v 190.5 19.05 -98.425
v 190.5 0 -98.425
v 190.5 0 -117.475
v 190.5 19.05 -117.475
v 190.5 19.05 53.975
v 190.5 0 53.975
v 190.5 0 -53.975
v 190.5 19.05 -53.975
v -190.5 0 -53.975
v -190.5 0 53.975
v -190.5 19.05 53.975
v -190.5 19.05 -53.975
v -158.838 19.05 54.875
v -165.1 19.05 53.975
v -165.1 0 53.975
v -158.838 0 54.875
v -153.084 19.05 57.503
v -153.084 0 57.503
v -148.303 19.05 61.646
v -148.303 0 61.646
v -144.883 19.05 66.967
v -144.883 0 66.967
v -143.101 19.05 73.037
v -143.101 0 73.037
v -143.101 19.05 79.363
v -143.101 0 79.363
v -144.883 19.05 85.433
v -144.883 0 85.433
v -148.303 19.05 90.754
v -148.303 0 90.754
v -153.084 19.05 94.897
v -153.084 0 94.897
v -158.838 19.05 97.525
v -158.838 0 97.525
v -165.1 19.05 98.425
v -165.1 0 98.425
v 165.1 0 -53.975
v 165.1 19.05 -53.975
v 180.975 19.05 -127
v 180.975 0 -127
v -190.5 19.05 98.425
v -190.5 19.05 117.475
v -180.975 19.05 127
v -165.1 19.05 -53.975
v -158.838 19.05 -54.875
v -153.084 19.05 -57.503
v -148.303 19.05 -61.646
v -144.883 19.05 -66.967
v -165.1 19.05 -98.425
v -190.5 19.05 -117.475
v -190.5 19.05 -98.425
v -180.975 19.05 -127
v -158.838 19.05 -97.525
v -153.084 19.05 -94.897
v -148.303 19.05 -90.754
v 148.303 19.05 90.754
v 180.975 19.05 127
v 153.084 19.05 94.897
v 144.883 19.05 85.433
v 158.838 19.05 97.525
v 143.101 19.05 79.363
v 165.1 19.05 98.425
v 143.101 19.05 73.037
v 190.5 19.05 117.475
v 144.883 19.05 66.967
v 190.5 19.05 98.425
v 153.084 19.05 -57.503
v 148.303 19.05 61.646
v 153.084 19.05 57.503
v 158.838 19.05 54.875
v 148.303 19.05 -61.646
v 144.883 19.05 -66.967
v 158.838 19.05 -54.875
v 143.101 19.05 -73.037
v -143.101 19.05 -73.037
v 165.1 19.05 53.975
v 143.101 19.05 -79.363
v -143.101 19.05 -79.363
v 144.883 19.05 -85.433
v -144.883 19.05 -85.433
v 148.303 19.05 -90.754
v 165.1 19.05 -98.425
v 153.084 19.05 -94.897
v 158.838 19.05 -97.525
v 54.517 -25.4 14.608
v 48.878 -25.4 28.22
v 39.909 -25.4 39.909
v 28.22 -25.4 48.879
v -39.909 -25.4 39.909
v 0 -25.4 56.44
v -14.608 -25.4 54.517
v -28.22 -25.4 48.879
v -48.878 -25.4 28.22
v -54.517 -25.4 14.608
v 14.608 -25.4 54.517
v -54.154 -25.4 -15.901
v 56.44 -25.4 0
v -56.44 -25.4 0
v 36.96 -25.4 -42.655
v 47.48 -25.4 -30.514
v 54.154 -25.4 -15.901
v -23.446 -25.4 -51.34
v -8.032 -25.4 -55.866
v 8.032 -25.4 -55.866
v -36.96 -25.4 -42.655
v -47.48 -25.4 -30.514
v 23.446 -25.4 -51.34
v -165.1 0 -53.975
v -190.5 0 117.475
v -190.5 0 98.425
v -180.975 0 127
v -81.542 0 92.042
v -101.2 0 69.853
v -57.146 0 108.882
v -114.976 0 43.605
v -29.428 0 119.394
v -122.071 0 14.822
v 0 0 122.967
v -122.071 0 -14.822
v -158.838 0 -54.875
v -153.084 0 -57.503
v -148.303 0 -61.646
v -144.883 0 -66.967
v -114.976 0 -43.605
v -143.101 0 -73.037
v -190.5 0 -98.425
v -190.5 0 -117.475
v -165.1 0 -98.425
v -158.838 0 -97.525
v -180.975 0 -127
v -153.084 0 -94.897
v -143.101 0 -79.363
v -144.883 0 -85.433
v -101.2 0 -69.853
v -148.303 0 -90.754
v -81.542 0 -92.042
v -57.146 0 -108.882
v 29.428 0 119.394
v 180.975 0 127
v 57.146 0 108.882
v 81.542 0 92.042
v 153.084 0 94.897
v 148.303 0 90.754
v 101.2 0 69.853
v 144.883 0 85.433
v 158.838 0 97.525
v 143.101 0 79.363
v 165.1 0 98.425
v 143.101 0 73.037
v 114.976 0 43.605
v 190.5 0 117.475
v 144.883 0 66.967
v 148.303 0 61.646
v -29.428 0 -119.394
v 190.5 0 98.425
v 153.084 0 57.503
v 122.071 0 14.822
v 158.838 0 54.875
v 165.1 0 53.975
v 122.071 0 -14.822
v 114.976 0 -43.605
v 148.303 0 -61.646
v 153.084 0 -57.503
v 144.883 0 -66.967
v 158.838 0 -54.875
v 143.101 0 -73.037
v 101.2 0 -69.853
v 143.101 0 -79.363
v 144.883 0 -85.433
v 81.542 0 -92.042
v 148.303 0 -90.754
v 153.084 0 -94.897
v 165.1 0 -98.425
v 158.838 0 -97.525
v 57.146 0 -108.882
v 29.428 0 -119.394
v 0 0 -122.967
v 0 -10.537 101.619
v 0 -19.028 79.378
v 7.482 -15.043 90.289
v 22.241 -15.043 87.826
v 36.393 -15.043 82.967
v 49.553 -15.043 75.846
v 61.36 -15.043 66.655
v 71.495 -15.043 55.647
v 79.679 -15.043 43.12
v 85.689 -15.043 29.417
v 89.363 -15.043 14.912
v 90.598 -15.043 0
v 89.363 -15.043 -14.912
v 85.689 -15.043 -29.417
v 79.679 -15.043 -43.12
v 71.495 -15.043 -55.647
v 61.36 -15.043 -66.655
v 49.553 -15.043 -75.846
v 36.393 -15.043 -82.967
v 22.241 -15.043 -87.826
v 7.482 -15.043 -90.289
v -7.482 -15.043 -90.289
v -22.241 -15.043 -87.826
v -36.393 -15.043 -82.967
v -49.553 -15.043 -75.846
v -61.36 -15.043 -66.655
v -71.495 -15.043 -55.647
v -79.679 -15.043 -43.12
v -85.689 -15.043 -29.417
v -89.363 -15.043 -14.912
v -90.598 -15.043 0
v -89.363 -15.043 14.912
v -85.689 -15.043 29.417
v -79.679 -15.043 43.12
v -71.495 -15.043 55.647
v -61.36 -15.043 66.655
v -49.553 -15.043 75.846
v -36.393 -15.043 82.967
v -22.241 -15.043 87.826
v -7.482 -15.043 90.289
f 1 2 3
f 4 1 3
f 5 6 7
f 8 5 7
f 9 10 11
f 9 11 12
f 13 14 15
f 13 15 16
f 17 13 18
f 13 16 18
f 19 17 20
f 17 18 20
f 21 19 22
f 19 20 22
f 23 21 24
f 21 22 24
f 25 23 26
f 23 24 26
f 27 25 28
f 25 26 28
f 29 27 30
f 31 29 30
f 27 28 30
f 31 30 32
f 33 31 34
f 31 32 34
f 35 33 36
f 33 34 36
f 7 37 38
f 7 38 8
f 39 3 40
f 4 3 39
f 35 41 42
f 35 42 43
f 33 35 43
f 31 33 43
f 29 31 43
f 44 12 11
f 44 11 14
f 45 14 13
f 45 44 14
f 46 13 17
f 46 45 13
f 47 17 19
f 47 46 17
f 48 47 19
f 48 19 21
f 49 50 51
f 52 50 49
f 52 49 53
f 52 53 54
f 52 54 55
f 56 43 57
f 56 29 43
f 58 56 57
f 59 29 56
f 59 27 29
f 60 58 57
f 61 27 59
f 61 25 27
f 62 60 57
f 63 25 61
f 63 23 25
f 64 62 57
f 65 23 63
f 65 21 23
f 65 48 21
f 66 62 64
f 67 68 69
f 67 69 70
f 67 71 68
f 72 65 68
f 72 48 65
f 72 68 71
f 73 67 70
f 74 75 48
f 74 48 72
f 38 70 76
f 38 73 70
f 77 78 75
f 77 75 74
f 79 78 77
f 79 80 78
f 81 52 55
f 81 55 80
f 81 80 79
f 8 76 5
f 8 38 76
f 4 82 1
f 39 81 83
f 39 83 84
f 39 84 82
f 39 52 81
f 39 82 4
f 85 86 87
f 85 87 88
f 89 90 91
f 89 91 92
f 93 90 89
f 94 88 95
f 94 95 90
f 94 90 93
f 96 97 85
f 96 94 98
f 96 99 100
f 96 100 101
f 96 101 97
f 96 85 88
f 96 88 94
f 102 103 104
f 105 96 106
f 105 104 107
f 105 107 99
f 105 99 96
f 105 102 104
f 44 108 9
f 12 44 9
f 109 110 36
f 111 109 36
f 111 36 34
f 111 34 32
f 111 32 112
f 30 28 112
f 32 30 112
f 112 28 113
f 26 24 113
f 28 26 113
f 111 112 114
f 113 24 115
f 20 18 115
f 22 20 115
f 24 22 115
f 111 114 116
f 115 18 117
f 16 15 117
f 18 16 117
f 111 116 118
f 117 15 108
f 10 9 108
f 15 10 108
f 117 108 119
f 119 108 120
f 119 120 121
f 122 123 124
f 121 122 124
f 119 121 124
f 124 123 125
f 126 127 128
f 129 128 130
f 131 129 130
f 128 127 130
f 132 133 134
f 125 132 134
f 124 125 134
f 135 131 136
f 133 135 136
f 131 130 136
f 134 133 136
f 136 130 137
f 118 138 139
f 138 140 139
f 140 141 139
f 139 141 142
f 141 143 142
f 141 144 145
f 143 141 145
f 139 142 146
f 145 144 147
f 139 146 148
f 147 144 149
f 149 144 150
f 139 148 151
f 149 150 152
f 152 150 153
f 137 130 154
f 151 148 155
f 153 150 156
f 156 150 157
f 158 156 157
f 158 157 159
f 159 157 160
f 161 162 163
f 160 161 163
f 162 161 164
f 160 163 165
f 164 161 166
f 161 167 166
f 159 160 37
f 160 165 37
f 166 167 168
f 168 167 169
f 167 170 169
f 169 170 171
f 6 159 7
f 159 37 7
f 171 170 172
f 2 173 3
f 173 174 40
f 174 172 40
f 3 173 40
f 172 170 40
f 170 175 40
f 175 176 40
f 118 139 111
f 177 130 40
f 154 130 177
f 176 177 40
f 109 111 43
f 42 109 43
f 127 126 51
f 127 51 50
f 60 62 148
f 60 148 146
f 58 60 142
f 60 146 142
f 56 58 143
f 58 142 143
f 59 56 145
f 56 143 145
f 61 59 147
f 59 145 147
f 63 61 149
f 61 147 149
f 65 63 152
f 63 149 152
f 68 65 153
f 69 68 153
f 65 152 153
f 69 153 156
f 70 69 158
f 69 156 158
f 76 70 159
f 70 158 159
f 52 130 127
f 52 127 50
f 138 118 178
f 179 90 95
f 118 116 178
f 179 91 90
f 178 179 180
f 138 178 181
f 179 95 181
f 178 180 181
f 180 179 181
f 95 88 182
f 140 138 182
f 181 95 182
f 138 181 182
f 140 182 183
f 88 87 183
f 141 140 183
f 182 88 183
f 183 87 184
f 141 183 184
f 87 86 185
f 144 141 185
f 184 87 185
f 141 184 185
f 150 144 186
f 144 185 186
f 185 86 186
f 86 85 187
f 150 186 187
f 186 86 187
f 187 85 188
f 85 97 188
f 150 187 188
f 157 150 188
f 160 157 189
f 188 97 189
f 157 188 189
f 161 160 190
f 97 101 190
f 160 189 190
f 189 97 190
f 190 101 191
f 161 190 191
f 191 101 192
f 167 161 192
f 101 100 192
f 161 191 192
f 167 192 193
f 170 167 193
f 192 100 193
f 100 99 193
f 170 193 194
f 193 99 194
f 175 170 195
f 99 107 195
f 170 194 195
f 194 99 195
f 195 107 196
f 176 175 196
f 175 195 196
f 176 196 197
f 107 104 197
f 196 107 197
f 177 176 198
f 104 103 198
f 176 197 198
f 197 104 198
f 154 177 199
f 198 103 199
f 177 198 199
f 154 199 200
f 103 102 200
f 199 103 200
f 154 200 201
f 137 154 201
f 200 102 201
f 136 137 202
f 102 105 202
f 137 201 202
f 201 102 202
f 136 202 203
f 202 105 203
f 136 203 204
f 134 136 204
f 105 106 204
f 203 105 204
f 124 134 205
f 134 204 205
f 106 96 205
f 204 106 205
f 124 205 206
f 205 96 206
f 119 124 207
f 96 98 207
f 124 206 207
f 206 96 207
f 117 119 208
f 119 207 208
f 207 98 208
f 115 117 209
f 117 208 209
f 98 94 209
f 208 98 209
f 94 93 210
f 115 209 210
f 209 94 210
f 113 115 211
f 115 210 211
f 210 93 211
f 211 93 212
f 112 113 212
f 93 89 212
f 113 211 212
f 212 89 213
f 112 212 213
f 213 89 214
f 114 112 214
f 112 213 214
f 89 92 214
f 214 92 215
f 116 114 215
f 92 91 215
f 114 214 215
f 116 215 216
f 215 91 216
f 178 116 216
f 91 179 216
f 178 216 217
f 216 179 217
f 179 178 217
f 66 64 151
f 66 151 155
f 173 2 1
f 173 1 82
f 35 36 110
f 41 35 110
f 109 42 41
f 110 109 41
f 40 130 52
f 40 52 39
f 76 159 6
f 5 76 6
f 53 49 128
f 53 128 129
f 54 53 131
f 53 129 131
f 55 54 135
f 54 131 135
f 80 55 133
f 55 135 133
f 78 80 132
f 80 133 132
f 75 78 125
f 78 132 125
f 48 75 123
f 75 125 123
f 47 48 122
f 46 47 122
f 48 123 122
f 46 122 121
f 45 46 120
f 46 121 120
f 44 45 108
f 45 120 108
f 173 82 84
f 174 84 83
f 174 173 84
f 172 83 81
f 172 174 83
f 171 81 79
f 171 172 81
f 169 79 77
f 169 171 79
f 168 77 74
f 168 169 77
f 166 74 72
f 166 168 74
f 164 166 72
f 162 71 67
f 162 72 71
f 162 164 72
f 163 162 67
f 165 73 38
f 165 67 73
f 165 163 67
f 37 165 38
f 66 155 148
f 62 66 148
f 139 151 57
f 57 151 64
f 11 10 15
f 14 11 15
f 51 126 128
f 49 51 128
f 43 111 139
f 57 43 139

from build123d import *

# Parameters (mm, degrees)
SKETCH1_W               = 381
SKETCH1_H               = 254
BASE_EXTRUDE_DEPTH      = 19.05
CUT_EXTRUDE1_DEPTH      = 20.05
CUT_EXTRUDE2_DEPTH      = 128
CUT_EXTRUDE2_DEPTH_BACK = 128
CHAMFER1_SIZE           = 9.525


with BuildPart() as part:
    # Sketch1 → Base-Extrude (new body)
    with BuildSketch(Plane(origin=(0, 0, 0), x_dir=(1, 0, 0), z_dir=(0, 1, 0))):
        Rectangle(SKETCH1_W, SKETCH1_H)
    extrude(amount=BASE_EXTRUDE_DEPTH)

    # Sketch2 → Boss-Revolve1 (revolve)
    with BuildSketch(Plane(origin=(0, 0, 0), x_dir=(0, 0, -1), z_dir=(1, 0, 0)), mode=Mode.PRIVATE) as boss_revolve1_sk:
        with BuildLine():
            Line((0, -31.75), (0, 0))
            Line((0, 0), (122.967221242, 0))
            ThreePointArc((122.967221242, 0), (63.5, -23.684442484), (0, -31.75))
        make_face()
    revolve(boss_revolve1_sk.sketch.rotate(Axis((0, -41.201658399, 0), (0, 1, 0)), 180), axis=Axis((0, -41.201658399, 0), (0, 1, 0)))  # turned: the seam where the file's is

    # Sketch4 → Cut-Extrude1 (cut, through all)
    with BuildSketch(Plane.XZ):
        with BuildLine():
            Line((-190.5, 53.975), (-165.1, 53.975))
            ThreePointArc((-165.1, 53.975), (-142.875, 76.2), (-165.1, 98.425))
            Line((-165.1, 98.425), (-190.5, 98.425))
            Line((-190.5, 98.425), (-190.5, 53.975))
        make_face()
        with BuildLine():
            Line((-190.5, -98.425), (-165.1, -98.425))
            ThreePointArc((-165.1, -98.425), (-142.875, -76.2), (-165.1, -53.975))
            Line((-165.1, -53.975), (-190.5, -53.975))
            Line((-190.5, -53.975), (-190.5, -98.425))
        make_face()
        with BuildLine():
            Line((190.5, -98.425), (165.1, -98.425))
            ThreePointArc((165.1, -98.425), (142.875, -76.2), (165.1, -53.975))
            Line((165.1, -53.975), (190.5, -53.975))
            Line((190.5, -53.975), (190.5, -98.425))
        make_face()
        with BuildLine():
            Line((165.1, 53.975), (190.5, 53.975))
            Line((190.5, 53.975), (190.5, 98.425))
            Line((190.5, 98.425), (165.1, 98.425))
            ThreePointArc((165.1, 98.425), (142.875, 76.2), (165.1, 53.975))
        make_face()
    extrude(amount=-CUT_EXTRUDE1_DEPTH, mode=Mode.SUBTRACT)

    # Sketch5 → Cut-Extrude2 (cut, two sides)
    with BuildSketch(Plane.XY) as cut_extrude2_sk:
        with BuildLine():
            Line((56.44003455, -25.4), (-56.44003455, -25.4))
            ThreePointArc((-56.44003455, -25.4), (0, -31.75), (56.44003455, -25.4))
        make_face()
    extrude(amount=CUT_EXTRUDE2_DEPTH, mode=Mode.SUBTRACT)
    extrude(cut_extrude2_sk.sketch, amount=-CUT_EXTRUDE2_DEPTH_BACK, mode=Mode.SUBTRACT)

    # Chamfer1
    chamfer1_edges = [part.edges().sort_by_distance(p)[0] for p in [
        (-190.5, 9.525, 127),
        (190.5, 9.525, 127),
        (190.5, 9.525, -127),
        (-190.5, 9.525, -127),
    ]]
    chamfer(chamfer1_edges, length=CHAMFER1_SIZE)


solid = part.part
